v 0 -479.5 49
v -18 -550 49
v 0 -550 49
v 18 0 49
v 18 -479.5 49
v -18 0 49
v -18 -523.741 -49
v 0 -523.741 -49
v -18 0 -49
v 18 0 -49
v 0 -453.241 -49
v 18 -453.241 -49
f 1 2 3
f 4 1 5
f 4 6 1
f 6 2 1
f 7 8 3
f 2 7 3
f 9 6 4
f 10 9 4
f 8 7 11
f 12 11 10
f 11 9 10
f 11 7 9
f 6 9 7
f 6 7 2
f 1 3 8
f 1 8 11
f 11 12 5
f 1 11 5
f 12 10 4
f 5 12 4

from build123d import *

# Parameters (mm, degrees)
F0_W     = 36
F0_H     = 98
F1_DEPTH = 550
F3_DEPTH = 36
F5_DEPTH = 18


with BuildPart() as f1:
    # F0 (on Front) → F1 (new body)
    with BuildSketch(Plane.XZ):
        Rectangle(F0_W, F0_H)
    extrude(amount=F1_DEPTH)

    # F2 (on face) → F3 (cut, through all)
    with BuildSketch(Plane.YZ.offset(18)):
        Polygon((-523.740979, -49), (-550, 49), (-550, -49), align=None)
    extrude(amount=-F3_DEPTH, mode=Mode.SUBTRACT)

    # F4 (on face) → F5 (cut)
    with BuildSketch(Plane.YZ.offset(18)):
        Polygon((-479.5, 49), (-550, 49), (-523.740979, -49), (-453.240979, -49), align=None)
    extrude(amount=-F5_DEPTH, mode=Mode.SUBTRACT)


solid = f1.part
